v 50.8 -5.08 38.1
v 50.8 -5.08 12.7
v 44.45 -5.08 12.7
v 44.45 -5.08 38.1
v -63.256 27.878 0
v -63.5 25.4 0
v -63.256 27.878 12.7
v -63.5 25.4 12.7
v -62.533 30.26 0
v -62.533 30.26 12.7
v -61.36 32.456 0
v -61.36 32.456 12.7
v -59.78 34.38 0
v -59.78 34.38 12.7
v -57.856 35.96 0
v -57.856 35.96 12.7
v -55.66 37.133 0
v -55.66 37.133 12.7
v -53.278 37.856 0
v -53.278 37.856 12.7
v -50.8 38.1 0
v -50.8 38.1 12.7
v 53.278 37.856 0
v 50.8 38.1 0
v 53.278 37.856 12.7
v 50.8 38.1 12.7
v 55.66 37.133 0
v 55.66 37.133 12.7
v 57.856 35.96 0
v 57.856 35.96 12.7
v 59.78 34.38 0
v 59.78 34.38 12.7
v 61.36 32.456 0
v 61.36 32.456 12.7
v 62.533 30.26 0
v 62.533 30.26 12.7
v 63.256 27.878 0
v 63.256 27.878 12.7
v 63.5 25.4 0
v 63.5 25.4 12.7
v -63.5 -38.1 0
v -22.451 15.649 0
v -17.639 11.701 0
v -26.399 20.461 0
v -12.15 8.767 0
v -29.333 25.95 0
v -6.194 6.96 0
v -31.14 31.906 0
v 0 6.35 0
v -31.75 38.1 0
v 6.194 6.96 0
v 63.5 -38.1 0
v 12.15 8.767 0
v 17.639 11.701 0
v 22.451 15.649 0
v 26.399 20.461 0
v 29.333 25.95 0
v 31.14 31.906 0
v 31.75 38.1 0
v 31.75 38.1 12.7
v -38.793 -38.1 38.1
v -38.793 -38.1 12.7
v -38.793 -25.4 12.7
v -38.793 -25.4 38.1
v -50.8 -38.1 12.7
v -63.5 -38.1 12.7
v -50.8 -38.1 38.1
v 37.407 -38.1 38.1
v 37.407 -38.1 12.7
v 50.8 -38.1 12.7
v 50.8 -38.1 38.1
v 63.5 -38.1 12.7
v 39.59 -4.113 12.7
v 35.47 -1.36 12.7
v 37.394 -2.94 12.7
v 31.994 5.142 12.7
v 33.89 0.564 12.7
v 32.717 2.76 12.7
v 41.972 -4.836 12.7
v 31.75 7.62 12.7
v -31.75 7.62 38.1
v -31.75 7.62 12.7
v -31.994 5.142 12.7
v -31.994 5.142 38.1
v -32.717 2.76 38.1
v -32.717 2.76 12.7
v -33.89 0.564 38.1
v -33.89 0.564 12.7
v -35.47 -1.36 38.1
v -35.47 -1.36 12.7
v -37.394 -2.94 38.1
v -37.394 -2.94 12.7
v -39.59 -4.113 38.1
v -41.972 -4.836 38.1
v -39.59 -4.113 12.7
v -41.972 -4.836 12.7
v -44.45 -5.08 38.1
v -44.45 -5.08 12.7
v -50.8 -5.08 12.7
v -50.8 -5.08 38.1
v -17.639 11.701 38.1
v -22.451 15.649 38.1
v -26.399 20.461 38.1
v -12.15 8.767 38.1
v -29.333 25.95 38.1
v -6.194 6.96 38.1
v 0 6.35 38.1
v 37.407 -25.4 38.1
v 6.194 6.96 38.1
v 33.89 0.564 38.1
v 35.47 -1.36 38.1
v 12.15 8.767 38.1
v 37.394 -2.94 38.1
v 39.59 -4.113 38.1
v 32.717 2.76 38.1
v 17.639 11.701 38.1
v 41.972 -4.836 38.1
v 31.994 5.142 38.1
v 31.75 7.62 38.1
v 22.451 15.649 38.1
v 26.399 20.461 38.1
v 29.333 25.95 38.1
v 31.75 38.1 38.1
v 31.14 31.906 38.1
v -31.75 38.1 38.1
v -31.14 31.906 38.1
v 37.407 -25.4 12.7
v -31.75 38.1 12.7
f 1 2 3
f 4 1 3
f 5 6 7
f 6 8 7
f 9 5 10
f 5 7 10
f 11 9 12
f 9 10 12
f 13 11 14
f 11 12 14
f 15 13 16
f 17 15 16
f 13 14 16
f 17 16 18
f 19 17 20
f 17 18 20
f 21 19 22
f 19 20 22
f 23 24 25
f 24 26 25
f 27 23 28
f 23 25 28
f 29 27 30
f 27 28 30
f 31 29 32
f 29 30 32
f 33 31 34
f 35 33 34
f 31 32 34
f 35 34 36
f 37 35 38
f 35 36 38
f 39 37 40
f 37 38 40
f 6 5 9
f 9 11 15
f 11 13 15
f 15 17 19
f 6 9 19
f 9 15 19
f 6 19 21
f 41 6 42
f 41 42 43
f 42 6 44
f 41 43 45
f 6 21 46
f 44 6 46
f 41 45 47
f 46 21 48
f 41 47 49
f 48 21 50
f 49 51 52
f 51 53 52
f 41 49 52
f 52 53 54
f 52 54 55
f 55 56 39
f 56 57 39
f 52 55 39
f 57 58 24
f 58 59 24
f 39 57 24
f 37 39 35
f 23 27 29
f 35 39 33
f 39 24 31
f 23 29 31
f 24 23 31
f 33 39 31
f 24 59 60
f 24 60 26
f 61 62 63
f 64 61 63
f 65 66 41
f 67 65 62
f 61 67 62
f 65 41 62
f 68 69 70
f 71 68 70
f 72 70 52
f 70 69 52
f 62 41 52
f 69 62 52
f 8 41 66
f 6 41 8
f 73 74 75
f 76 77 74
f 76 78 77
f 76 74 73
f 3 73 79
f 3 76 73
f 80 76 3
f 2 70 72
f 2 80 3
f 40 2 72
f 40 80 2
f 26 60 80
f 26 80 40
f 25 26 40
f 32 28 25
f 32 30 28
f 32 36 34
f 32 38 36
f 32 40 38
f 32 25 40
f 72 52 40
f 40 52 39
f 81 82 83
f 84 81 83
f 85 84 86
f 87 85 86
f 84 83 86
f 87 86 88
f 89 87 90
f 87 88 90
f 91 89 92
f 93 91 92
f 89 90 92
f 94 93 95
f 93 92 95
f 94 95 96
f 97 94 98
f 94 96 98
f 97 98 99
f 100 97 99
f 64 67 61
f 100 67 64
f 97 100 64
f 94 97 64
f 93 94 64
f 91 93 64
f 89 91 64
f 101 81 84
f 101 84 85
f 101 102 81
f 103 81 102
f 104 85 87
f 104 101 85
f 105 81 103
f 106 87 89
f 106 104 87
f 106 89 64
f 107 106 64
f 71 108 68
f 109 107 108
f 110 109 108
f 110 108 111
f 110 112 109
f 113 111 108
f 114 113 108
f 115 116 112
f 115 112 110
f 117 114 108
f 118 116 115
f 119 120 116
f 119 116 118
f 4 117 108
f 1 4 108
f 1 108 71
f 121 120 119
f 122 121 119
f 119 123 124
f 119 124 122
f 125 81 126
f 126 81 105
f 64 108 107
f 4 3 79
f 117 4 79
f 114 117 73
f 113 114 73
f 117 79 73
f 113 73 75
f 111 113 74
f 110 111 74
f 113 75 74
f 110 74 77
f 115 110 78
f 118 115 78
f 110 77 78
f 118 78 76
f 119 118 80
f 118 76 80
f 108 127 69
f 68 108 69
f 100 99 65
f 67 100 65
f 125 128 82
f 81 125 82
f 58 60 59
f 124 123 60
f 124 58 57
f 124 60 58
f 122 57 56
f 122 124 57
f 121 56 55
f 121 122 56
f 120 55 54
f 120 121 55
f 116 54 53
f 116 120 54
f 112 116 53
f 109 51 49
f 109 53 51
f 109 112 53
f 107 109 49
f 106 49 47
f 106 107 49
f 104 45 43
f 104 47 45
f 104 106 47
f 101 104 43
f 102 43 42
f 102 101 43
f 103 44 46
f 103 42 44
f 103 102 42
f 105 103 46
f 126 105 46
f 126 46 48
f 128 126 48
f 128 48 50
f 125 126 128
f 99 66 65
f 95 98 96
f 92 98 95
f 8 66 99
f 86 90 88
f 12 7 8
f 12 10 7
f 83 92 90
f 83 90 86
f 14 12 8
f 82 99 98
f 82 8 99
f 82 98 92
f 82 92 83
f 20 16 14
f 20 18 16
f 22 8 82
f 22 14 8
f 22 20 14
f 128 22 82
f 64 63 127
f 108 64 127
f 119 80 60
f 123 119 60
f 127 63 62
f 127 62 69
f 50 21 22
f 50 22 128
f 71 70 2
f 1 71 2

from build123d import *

# Parameters (mm, degrees)
F0_W     = 127
F0_H     = 76.2
F1_DEPTH = 12.7
F3_DEPTH = 25.4
F4_R     = 12.7
F5_DEPTH = 12.701


with BuildPart() as f1:
    # F0 (on Top) → F1 (new body)
    with BuildSketch(Plane.XY):
        Rectangle(F0_W, F0_H)
    extrude(amount=F1_DEPTH)

    # F2 (on face) → F3 (join)
    with BuildSketch(Plane.XY.offset(12.7)):
        with BuildLine():
            Line((31.75, 7.62), (31.75, 38.1))
            ThreePointArc((31.75, 38.1), (0, 6.35), (-31.75, 38.1))
            Line((-31.75, 38.1), (-31.75, 7.62))
            ThreePointArc((-31.75, 7.62), (-35.4697438789, -1.3602561211), (-44.45, -5.08))
            Line((-44.45, -5.08), (-50.8, -5.08))
            Line((-50.8, -5.08), (-50.8, -38.1))
            Line((-50.8, -38.1), (-38.7925468385, -38.1))
            Line((-38.7925468385, -38.1), (-38.7925468385, -25.4))
            Line((-38.7925468385, -25.4), (37.4074531615, -25.4))
            Line((37.4074531615, -25.4), (37.4074531615, -38.1))
            Line((37.4074531615, -38.1), (50.8, -38.1))
            Line((50.8, -38.1), (50.8, -5.08))
            Line((50.8, -5.08), (44.45, -5.08))
            ThreePointArc((44.45, -5.08), (35.4697438789, -1.3602561211), (31.75, 7.62))
        make_face()
    extrude(amount=F3_DEPTH)

    # F4
    f4_edges = [f1.edges().sort_by_distance(p)[0] for p in [
        (-63.5, 38.1, 6.35),
        (63.5, 38.1, 6.35),
    ]]
    fillet(f4_edges, radius=F4_R)

    # F5 (cut, through all): a face of the model
    f5_faces = [f1.faces().sort_by_distance(p)[0] for p in [
        (0, 24.6248814849, 12.7),
    ]]
    extrude(f5_faces, amount=-F5_DEPTH, mode=Mode.SUBTRACT)


solid = f1.part
